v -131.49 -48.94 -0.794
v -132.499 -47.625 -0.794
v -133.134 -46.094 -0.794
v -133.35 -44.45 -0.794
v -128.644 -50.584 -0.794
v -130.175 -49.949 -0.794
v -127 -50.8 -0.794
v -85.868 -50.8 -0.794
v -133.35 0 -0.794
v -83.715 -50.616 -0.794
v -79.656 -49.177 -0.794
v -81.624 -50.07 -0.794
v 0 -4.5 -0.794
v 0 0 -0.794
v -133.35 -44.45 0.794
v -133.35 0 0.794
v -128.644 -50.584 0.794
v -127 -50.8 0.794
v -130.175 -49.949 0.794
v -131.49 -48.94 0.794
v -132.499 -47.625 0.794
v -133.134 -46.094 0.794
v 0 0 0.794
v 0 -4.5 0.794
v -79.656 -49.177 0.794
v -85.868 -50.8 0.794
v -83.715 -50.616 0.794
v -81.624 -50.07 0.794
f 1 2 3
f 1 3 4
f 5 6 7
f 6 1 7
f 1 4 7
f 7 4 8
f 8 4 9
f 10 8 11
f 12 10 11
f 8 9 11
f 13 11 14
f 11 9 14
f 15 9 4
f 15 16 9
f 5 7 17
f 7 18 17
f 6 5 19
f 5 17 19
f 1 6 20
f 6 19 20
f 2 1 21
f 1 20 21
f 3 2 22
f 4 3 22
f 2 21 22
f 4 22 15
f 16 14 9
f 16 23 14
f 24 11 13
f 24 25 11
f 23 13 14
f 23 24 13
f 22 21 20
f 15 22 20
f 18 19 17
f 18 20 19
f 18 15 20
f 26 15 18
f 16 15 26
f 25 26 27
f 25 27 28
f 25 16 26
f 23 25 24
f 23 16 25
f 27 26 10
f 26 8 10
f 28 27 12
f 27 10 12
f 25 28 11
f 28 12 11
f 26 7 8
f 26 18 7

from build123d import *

# Parameters (mm, degrees)
BOSS_EXTRUDE1_DEPTH = 0.79375
FILLET1_R           = 6.35
FILLET2_R           = 12.7


with BuildPart() as part:
    # Sketch1 → Boss-Extrude1 (new, symmetric)
    with BuildSketch(Plane.XY):
        Polygon((0, 0), (-133.35, 0), (-133.35, -50.8), (-82.55, -50.8), (0, -4.5), align=None)
    extrude(amount=BOSS_EXTRUDE1_DEPTH, both=True)

    # Fillet1
    fillet1_edges = [part.edges().sort_by_distance(p)[0] for p in [
        (-133.35, -50.8, 0),
    ]]
    fillet(fillet1_edges, radius=FILLET1_R)

    # Fillet2
    fillet2_edges = [part.edges().sort_by_distance(p)[0] for p in [
        (-82.55, -50.8, 0),
    ]]
    fillet(fillet2_edges, radius=FILLET2_R)


solid = part.part
